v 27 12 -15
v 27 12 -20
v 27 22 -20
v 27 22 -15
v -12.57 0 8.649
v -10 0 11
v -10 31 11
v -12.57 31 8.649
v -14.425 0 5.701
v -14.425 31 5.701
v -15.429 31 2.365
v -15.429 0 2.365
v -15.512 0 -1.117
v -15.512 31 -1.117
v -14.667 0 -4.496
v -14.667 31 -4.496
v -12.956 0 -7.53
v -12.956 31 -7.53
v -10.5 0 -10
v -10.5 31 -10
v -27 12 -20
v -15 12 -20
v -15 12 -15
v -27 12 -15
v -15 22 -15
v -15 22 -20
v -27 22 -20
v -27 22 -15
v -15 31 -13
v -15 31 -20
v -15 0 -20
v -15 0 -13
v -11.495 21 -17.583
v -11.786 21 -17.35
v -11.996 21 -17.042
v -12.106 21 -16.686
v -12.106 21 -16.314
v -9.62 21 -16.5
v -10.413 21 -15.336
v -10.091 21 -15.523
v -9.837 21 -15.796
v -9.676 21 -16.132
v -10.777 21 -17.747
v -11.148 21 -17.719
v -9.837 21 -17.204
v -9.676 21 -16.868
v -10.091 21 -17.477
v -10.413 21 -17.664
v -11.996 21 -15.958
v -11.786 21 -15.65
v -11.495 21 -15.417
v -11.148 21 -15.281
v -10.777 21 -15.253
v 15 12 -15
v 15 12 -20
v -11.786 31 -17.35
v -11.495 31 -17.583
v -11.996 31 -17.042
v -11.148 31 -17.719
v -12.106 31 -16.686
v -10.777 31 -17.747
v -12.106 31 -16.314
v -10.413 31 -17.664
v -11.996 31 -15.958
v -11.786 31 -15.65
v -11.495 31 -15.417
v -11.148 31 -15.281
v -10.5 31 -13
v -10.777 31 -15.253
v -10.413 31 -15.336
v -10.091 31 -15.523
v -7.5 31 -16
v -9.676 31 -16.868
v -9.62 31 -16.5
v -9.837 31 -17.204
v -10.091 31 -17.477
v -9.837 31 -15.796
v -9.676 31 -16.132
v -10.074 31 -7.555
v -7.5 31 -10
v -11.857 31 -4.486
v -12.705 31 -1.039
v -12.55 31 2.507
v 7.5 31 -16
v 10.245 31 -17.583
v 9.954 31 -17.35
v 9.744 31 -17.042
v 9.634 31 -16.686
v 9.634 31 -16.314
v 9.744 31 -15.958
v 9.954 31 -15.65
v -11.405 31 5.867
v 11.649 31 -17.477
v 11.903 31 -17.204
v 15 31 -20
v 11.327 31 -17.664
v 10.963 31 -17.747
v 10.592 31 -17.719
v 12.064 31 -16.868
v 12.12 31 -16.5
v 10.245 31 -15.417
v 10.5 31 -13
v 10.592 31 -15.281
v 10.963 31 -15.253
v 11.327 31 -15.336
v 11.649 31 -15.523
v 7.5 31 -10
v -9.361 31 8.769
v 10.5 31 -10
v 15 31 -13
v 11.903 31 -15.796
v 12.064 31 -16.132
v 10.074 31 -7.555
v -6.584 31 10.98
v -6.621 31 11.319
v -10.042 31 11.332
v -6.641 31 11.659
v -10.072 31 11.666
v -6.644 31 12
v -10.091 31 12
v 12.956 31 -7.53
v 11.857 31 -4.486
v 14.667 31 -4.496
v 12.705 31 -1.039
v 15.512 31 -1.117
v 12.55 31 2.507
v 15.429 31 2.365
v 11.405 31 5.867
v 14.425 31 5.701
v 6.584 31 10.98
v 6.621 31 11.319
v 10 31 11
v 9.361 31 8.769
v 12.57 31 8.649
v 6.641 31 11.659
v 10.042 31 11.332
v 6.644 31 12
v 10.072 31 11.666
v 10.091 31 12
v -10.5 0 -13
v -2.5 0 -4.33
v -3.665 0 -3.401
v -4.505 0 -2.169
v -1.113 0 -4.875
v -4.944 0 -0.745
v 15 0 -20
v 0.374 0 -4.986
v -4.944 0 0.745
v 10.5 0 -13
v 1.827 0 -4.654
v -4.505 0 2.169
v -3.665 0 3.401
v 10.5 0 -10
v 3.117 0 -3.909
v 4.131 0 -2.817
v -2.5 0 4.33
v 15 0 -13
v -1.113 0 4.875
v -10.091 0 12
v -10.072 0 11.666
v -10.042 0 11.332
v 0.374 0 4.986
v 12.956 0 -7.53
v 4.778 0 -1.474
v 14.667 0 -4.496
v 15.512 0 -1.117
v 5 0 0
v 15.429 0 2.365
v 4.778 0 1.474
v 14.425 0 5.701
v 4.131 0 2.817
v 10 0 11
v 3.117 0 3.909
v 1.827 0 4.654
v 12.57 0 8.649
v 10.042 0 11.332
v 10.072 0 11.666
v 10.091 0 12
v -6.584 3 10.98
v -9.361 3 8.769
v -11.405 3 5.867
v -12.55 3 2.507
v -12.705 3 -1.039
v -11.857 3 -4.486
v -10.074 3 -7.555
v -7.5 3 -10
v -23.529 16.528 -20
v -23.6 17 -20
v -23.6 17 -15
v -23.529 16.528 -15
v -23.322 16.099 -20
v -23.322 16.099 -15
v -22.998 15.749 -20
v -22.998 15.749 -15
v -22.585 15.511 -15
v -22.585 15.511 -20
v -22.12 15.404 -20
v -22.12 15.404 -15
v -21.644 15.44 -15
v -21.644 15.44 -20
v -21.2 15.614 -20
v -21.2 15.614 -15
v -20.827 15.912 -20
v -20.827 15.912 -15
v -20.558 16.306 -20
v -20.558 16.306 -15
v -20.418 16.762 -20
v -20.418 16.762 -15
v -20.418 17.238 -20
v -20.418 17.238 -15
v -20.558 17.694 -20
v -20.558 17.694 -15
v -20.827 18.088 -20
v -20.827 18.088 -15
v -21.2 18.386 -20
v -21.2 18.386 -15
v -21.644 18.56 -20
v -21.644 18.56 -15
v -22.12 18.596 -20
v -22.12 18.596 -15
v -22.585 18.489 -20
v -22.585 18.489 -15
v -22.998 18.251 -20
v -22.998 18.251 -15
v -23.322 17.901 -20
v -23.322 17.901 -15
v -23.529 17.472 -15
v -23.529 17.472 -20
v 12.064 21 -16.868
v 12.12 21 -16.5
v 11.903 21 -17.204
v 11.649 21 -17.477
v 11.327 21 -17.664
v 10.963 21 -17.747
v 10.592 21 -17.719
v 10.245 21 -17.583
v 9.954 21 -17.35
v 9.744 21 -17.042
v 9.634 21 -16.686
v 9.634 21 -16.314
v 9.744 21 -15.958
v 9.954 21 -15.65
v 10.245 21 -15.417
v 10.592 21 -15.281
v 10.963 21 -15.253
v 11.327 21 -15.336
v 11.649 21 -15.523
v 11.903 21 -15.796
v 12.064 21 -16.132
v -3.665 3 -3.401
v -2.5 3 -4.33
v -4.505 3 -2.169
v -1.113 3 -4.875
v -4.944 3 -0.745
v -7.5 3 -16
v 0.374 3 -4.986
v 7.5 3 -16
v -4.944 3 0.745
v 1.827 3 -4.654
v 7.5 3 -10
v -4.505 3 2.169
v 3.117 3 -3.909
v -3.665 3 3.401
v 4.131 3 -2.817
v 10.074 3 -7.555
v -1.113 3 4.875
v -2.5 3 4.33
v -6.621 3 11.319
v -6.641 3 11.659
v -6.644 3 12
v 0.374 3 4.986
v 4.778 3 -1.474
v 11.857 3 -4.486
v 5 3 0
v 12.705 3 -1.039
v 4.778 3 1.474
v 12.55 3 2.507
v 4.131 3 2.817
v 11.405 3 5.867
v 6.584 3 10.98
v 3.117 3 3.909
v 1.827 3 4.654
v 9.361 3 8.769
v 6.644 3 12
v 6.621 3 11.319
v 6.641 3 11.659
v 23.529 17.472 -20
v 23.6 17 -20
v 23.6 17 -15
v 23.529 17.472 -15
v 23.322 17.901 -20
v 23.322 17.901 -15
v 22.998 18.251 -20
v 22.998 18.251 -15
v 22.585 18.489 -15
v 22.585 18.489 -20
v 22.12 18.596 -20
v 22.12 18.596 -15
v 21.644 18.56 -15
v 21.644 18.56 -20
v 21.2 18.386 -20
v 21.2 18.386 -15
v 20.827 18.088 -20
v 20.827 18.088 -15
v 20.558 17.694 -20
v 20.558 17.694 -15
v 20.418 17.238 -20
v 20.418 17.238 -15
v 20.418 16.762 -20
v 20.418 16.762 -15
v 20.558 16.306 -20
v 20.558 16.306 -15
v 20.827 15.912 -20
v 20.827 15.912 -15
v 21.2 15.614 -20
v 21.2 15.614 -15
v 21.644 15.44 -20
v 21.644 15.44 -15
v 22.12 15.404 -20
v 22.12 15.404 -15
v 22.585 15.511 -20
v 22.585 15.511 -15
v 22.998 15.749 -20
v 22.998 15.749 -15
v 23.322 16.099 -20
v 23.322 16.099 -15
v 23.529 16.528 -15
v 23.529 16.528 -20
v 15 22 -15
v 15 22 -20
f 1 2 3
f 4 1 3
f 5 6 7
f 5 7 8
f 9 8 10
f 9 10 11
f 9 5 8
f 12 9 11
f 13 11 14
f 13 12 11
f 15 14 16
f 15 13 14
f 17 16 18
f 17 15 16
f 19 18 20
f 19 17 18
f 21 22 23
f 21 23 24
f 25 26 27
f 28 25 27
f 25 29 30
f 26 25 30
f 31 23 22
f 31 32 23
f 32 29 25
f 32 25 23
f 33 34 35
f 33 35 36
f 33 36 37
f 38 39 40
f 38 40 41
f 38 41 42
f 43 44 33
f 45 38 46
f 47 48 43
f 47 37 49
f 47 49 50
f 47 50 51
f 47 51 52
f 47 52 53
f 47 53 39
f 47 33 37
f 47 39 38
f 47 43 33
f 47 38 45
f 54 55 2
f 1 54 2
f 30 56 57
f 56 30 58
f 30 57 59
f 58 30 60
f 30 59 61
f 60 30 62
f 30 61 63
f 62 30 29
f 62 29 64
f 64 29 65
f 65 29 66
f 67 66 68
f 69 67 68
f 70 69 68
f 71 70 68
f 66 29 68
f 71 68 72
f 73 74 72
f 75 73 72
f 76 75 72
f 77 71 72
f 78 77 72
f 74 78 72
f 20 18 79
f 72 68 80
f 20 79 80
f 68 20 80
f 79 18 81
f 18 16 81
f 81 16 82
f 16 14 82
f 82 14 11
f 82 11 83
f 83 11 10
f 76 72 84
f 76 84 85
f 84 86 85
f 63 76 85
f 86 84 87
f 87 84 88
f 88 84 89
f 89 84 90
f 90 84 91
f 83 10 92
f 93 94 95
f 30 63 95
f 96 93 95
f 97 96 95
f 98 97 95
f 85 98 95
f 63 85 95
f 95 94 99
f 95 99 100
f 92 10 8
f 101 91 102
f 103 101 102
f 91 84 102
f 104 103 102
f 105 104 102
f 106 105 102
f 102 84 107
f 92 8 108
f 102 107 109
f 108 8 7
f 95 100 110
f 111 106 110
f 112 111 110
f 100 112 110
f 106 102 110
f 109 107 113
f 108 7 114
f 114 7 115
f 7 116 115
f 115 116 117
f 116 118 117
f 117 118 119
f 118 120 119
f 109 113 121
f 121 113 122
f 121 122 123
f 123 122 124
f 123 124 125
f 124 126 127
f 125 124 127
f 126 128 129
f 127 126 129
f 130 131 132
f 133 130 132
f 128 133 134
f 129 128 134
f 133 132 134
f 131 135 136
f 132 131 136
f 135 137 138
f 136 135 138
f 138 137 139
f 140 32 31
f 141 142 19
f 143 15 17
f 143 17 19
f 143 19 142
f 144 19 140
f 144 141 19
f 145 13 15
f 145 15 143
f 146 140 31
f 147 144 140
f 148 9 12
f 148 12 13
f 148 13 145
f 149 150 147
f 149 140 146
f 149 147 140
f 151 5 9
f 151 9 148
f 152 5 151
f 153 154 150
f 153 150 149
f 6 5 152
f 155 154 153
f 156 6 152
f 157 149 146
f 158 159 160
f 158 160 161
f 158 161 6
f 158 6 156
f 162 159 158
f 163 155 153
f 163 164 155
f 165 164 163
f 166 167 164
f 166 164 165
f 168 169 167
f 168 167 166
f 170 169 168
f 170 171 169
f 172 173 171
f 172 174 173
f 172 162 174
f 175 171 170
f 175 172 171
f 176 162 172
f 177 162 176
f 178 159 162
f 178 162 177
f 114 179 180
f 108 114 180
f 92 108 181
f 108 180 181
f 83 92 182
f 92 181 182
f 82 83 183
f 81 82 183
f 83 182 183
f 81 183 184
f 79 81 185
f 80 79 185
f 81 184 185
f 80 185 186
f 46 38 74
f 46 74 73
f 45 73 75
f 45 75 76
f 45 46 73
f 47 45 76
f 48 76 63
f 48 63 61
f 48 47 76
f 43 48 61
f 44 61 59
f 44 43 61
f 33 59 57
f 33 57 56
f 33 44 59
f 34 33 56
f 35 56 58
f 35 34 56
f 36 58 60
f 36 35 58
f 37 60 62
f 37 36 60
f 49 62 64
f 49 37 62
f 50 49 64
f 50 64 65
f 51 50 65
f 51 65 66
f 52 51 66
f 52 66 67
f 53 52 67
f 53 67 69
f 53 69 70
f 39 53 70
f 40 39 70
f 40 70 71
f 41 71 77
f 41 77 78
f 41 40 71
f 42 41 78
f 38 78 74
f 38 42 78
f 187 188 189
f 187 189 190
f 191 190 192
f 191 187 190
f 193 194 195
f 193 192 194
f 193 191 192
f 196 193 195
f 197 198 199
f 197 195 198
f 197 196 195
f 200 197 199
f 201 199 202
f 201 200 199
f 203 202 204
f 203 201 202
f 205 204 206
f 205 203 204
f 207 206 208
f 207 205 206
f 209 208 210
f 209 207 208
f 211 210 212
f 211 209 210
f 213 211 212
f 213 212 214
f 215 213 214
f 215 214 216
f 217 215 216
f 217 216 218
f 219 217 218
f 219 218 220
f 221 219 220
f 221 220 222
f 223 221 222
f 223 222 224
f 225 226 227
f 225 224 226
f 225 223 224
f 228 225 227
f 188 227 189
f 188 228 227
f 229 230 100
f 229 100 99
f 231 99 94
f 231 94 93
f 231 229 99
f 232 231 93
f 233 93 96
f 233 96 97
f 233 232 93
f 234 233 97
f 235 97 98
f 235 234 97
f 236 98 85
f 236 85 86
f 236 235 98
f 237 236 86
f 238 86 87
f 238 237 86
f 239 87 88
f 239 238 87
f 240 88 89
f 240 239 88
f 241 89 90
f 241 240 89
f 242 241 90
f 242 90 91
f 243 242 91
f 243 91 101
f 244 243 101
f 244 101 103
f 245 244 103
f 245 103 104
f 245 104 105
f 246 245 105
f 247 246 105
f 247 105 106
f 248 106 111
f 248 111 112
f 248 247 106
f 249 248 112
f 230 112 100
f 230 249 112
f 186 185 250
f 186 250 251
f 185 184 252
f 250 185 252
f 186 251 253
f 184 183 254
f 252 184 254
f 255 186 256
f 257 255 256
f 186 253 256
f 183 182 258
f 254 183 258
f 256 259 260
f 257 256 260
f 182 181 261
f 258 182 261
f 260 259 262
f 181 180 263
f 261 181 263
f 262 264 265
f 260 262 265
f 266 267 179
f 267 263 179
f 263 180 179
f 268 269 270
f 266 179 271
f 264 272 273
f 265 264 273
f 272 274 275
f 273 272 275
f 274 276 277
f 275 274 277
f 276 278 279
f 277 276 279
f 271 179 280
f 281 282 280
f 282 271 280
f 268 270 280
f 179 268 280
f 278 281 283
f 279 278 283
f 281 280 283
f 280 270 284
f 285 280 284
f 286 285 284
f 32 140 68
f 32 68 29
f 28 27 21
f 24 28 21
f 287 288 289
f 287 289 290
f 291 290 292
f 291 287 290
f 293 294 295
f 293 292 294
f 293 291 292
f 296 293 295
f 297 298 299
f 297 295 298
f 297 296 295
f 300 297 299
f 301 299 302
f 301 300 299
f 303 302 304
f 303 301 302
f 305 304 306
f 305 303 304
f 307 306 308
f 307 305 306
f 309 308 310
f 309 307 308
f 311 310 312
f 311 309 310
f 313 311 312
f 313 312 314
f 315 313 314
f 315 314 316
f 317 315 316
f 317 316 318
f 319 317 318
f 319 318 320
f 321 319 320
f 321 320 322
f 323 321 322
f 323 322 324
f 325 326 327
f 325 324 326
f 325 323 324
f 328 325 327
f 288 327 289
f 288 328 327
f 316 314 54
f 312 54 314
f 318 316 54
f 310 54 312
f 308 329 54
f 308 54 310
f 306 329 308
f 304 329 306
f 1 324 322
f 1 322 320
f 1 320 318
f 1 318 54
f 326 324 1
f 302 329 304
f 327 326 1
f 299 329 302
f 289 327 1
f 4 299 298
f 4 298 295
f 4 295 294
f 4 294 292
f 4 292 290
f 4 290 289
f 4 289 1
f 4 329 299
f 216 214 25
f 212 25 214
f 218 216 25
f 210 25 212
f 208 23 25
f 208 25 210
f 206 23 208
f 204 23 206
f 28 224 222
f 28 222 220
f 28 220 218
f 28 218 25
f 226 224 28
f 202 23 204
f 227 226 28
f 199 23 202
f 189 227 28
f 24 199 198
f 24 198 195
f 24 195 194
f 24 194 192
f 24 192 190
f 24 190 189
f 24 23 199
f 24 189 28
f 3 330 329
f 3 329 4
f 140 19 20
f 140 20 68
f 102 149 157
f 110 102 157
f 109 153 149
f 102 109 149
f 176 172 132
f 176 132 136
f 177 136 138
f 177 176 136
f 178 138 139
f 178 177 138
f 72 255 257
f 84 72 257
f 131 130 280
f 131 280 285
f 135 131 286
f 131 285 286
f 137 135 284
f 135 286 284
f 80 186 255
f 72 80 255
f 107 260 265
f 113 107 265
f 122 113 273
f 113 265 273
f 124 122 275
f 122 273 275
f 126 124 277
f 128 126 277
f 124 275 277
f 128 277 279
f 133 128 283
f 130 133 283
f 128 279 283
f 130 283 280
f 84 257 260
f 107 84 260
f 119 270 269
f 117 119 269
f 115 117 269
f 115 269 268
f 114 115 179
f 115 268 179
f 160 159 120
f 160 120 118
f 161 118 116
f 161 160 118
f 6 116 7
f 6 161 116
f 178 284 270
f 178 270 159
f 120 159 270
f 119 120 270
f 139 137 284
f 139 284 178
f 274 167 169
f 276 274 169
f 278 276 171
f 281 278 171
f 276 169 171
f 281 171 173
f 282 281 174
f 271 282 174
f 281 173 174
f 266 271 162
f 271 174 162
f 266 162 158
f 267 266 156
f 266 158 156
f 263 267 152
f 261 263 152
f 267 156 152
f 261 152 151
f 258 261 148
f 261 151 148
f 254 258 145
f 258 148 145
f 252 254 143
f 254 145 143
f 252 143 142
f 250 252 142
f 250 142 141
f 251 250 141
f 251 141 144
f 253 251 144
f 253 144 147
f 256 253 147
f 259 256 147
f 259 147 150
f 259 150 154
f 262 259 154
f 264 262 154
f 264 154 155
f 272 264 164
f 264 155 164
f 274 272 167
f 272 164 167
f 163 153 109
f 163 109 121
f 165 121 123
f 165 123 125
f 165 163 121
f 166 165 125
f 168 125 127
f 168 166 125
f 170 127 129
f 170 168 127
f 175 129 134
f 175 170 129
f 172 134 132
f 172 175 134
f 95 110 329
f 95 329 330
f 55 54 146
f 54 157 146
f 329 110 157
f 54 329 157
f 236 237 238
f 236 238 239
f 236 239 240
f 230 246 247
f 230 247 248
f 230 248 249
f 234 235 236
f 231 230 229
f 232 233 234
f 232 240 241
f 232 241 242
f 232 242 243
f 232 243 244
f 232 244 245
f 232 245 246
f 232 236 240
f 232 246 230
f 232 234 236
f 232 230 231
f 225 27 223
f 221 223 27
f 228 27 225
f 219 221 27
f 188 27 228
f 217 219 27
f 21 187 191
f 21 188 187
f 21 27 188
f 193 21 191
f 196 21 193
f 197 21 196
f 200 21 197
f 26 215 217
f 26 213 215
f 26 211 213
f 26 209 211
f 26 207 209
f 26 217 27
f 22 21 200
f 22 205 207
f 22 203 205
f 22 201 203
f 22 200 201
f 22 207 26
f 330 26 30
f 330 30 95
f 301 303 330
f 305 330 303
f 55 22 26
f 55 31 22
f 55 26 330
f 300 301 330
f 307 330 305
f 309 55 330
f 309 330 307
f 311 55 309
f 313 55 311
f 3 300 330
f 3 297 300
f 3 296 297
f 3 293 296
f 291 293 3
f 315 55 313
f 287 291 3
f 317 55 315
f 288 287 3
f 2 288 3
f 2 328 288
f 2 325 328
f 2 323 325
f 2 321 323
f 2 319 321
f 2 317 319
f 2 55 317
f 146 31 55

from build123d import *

# Parameters (mm, degrees)
BOX043_W               = 24
BOX043_H               = 42
BOX043_DEPTH           = 13
SKETCH021_R            = 5
EXTRUDE021_DEPTH       = 3
CYLINDER038_R          = 1.6
CYLINDER038_DEPTH      = 10
BOX042_W               = 12
BOX042_H               = 10
BOX042_DEPTH           = 5
CUT030_PLACEMENT_ANGLE = 180
CYLINDER037_R          = 1.6
CYLINDER037_DEPTH      = 10
BOX041_W               = 12
BOX041_H               = 10
BOX041_DEPTH           = 5
BOX040_W               = 3
BOX040_H               = 2
BOX040_DEPTH           = 2
CYLINDER036_R          = 1.25
CYLINDER036_DEPTH      = 10
CYLINDER035_R          = 1.25
CYLINDER035_DEPTH      = 10
EXTRUDE020_DEPTH       = 28


with BuildPart() as cube025:
    # Box043 → Box043 (new body)
    with BuildSketch(Plane(origin=(-12, -2, 12), x_dir=(1, 0, 0), z_dir=(0, 0, 1))):
        with Locations((12, 21)):
            Rectangle(BOX043_W, BOX043_H)
    extrude(amount=BOX043_DEPTH)


with BuildPart() as front_cover:
    # Sketch021 → Extrude021 (new body)
    with BuildSketch(Plane.XZ):
        with BuildLine():
            ThreePointArc((10, 11), (0, 22.517745), (-10, 11))
            ThreePointArc((-10, 11), (-15.587711, 0.627088), (-10.5, -10))
            Line((-10.5, -10), (-10.5, -13))
            Line((-10.5, -13), (-15, -13))
            Line((-15, -13), (-15, -20))
            Line((-15, -20), (15, -20))
            Line((15, -13), (15, -20))
            Line((10.5, -13), (15, -13))
            Line((10.5, -10), (10.5, -13))
            ThreePointArc((10.5, -10), (15.587711, 0.627088), (10, 11))
        make_face()
        Circle(SKETCH021_R, mode=Mode.SUBTRACT)
    extrude(amount=-EXTRUDE021_DEPTH)


with BuildPart() as cylinder038:
    # Cylinder038 → Cylinder038 (new body)
    with BuildSketch(Plane(origin=(22, 17, -22), x_dir=(1, 0, 0), z_dir=(0, 0, 1))):
        Circle(CYLINDER038_R)
    extrude(amount=CYLINDER038_DEPTH)


with BuildPart() as cut030:
    # Box042 → Box042 (new body)
    with BuildSketch(Plane(origin=(15, 12, -20), x_dir=(1, 0, 0), z_dir=(0, 0, 1))):
        with Locations((6, 5)):
            Rectangle(BOX042_W, BOX042_H)
    extrude(amount=BOX042_DEPTH)

    # Cut030: cut Cylinder038
    add(cylinder038.part, mode=Mode.SUBTRACT)


with BuildPart() as cut030_1:
    # Cut030 placement: moved
    add(cut030.part.moved(Location((0, 34, 0))).rotate(Axis((0, 34, 0), (0, 0, 1)), CUT030_PLACEMENT_ANGLE))


with BuildPart() as cylinder037:
    # Cylinder037 → Cylinder037 (new body)
    with BuildSketch(Plane(origin=(22, 17, -22), x_dir=(1, 0, 0), z_dir=(0, 0, 1))):
        Circle(CYLINDER037_R)
    extrude(amount=CYLINDER037_DEPTH)


with BuildPart() as cut029:
    # Box041 → Box041 (new body)
    with BuildSketch(Plane(origin=(15, 12, -20), x_dir=(1, 0, 0), z_dir=(0, 0, 1))):
        with Locations((6, 5)):
            Rectangle(BOX041_W, BOX041_H)
    extrude(amount=BOX041_DEPTH)

    # Cut029: cut Cylinder037
    add(cylinder037.part, mode=Mode.SUBTRACT)


with BuildPart() as cube022:
    # Box040 → Box040 (new body)
    with BuildSketch(Plane(origin=(-1.5, 29, 19.5), x_dir=(1, 0, 0), z_dir=(0, 0, 1))):
        with Locations((1.5, 1)):
            Rectangle(BOX040_W, BOX040_H)
    extrude(amount=BOX040_DEPTH)


with BuildPart() as cylinder036:
    # Cylinder036 → Cylinder036 (new body)
    with BuildSketch(Plane(origin=(-10.87, 21, -16.5), x_dir=(1, 0, 0), z_dir=(0, 1, 0))):
        Circle(CYLINDER036_R)
    extrude(amount=CYLINDER036_DEPTH)


with BuildPart() as m2_cyl:
    # Cylinder035 → Cylinder035 (new body)
    with BuildSketch(Plane(origin=(10.87, 21, -16.5), x_dir=(1, 0, 0), z_dir=(0, 1, 0))):
        Circle(CYLINDER035_R)
    extrude(amount=CYLINDER035_DEPTH)

    # Fusion024: union Cylinder036
    add(cylinder036.part)


with BuildPart() as outerbox:
    # Sketch020 → Extrude020 (new body)
    with BuildSketch(Plane.XZ):
        with BuildLine():
            ThreePointArc((10, 11), (0, 22.517745), (-10, 11))
            ThreePointArc((-10, 11), (-15.587711, 0.627088), (-10.5, -10))
            Line((-10.5, -10), (-10.5, -13))
            Line((-10.5, -13), (-15, -13))
            Line((-15, -13), (-15, -20))
            Line((-15, -20), (15, -20))
            Line((15, -13), (15, -20))
            Line((10.5, -13), (15, -13))
            Line((10.5, -10), (10.5, -13))
            ThreePointArc((10.5, -10), (15.587711, 0.627088), (10, 11))
        make_face()
        with BuildLine():
            Line((-7.5, -10), (-7.5, -16))
            Line((-7.5, -16), (7.5, -16))
            Line((7.5, -16), (7.5, -10))
            ThreePointArc((7.5, -10), (12.754076, 0.73948), (6.583703, 10.98))
            ThreePointArc((6.583703, 10.98), (0, 18.524934), (-6.583703, 10.98))
            ThreePointArc((-6.583703, 10.98), (-12.754076, 0.73948), (-7.5, -10))
        make_face(mode=Mode.SUBTRACT)
    extrude(amount=-EXTRUDE020_DEPTH)


with BuildPart() as outerbox_1:
    # Extrude020 placement: moved
    add(outerbox.part.moved(Location((0, 3, 0))))

    # Cut027: cut m2_cyl
    add(m2_cyl.part, mode=Mode.SUBTRACT)

    # Cut028: cut Cube022
    add(cube022.part, mode=Mode.SUBTRACT)

    # Fusion026: union Front_cover, Cut030, Cut029
    add(front_cover.part)
    add(cut030_1.part)
    add(cut029.part)

    # Cut031: cut Cube025
    add(cube025.part, mode=Mode.SUBTRACT)


solid = outerbox_1.part
